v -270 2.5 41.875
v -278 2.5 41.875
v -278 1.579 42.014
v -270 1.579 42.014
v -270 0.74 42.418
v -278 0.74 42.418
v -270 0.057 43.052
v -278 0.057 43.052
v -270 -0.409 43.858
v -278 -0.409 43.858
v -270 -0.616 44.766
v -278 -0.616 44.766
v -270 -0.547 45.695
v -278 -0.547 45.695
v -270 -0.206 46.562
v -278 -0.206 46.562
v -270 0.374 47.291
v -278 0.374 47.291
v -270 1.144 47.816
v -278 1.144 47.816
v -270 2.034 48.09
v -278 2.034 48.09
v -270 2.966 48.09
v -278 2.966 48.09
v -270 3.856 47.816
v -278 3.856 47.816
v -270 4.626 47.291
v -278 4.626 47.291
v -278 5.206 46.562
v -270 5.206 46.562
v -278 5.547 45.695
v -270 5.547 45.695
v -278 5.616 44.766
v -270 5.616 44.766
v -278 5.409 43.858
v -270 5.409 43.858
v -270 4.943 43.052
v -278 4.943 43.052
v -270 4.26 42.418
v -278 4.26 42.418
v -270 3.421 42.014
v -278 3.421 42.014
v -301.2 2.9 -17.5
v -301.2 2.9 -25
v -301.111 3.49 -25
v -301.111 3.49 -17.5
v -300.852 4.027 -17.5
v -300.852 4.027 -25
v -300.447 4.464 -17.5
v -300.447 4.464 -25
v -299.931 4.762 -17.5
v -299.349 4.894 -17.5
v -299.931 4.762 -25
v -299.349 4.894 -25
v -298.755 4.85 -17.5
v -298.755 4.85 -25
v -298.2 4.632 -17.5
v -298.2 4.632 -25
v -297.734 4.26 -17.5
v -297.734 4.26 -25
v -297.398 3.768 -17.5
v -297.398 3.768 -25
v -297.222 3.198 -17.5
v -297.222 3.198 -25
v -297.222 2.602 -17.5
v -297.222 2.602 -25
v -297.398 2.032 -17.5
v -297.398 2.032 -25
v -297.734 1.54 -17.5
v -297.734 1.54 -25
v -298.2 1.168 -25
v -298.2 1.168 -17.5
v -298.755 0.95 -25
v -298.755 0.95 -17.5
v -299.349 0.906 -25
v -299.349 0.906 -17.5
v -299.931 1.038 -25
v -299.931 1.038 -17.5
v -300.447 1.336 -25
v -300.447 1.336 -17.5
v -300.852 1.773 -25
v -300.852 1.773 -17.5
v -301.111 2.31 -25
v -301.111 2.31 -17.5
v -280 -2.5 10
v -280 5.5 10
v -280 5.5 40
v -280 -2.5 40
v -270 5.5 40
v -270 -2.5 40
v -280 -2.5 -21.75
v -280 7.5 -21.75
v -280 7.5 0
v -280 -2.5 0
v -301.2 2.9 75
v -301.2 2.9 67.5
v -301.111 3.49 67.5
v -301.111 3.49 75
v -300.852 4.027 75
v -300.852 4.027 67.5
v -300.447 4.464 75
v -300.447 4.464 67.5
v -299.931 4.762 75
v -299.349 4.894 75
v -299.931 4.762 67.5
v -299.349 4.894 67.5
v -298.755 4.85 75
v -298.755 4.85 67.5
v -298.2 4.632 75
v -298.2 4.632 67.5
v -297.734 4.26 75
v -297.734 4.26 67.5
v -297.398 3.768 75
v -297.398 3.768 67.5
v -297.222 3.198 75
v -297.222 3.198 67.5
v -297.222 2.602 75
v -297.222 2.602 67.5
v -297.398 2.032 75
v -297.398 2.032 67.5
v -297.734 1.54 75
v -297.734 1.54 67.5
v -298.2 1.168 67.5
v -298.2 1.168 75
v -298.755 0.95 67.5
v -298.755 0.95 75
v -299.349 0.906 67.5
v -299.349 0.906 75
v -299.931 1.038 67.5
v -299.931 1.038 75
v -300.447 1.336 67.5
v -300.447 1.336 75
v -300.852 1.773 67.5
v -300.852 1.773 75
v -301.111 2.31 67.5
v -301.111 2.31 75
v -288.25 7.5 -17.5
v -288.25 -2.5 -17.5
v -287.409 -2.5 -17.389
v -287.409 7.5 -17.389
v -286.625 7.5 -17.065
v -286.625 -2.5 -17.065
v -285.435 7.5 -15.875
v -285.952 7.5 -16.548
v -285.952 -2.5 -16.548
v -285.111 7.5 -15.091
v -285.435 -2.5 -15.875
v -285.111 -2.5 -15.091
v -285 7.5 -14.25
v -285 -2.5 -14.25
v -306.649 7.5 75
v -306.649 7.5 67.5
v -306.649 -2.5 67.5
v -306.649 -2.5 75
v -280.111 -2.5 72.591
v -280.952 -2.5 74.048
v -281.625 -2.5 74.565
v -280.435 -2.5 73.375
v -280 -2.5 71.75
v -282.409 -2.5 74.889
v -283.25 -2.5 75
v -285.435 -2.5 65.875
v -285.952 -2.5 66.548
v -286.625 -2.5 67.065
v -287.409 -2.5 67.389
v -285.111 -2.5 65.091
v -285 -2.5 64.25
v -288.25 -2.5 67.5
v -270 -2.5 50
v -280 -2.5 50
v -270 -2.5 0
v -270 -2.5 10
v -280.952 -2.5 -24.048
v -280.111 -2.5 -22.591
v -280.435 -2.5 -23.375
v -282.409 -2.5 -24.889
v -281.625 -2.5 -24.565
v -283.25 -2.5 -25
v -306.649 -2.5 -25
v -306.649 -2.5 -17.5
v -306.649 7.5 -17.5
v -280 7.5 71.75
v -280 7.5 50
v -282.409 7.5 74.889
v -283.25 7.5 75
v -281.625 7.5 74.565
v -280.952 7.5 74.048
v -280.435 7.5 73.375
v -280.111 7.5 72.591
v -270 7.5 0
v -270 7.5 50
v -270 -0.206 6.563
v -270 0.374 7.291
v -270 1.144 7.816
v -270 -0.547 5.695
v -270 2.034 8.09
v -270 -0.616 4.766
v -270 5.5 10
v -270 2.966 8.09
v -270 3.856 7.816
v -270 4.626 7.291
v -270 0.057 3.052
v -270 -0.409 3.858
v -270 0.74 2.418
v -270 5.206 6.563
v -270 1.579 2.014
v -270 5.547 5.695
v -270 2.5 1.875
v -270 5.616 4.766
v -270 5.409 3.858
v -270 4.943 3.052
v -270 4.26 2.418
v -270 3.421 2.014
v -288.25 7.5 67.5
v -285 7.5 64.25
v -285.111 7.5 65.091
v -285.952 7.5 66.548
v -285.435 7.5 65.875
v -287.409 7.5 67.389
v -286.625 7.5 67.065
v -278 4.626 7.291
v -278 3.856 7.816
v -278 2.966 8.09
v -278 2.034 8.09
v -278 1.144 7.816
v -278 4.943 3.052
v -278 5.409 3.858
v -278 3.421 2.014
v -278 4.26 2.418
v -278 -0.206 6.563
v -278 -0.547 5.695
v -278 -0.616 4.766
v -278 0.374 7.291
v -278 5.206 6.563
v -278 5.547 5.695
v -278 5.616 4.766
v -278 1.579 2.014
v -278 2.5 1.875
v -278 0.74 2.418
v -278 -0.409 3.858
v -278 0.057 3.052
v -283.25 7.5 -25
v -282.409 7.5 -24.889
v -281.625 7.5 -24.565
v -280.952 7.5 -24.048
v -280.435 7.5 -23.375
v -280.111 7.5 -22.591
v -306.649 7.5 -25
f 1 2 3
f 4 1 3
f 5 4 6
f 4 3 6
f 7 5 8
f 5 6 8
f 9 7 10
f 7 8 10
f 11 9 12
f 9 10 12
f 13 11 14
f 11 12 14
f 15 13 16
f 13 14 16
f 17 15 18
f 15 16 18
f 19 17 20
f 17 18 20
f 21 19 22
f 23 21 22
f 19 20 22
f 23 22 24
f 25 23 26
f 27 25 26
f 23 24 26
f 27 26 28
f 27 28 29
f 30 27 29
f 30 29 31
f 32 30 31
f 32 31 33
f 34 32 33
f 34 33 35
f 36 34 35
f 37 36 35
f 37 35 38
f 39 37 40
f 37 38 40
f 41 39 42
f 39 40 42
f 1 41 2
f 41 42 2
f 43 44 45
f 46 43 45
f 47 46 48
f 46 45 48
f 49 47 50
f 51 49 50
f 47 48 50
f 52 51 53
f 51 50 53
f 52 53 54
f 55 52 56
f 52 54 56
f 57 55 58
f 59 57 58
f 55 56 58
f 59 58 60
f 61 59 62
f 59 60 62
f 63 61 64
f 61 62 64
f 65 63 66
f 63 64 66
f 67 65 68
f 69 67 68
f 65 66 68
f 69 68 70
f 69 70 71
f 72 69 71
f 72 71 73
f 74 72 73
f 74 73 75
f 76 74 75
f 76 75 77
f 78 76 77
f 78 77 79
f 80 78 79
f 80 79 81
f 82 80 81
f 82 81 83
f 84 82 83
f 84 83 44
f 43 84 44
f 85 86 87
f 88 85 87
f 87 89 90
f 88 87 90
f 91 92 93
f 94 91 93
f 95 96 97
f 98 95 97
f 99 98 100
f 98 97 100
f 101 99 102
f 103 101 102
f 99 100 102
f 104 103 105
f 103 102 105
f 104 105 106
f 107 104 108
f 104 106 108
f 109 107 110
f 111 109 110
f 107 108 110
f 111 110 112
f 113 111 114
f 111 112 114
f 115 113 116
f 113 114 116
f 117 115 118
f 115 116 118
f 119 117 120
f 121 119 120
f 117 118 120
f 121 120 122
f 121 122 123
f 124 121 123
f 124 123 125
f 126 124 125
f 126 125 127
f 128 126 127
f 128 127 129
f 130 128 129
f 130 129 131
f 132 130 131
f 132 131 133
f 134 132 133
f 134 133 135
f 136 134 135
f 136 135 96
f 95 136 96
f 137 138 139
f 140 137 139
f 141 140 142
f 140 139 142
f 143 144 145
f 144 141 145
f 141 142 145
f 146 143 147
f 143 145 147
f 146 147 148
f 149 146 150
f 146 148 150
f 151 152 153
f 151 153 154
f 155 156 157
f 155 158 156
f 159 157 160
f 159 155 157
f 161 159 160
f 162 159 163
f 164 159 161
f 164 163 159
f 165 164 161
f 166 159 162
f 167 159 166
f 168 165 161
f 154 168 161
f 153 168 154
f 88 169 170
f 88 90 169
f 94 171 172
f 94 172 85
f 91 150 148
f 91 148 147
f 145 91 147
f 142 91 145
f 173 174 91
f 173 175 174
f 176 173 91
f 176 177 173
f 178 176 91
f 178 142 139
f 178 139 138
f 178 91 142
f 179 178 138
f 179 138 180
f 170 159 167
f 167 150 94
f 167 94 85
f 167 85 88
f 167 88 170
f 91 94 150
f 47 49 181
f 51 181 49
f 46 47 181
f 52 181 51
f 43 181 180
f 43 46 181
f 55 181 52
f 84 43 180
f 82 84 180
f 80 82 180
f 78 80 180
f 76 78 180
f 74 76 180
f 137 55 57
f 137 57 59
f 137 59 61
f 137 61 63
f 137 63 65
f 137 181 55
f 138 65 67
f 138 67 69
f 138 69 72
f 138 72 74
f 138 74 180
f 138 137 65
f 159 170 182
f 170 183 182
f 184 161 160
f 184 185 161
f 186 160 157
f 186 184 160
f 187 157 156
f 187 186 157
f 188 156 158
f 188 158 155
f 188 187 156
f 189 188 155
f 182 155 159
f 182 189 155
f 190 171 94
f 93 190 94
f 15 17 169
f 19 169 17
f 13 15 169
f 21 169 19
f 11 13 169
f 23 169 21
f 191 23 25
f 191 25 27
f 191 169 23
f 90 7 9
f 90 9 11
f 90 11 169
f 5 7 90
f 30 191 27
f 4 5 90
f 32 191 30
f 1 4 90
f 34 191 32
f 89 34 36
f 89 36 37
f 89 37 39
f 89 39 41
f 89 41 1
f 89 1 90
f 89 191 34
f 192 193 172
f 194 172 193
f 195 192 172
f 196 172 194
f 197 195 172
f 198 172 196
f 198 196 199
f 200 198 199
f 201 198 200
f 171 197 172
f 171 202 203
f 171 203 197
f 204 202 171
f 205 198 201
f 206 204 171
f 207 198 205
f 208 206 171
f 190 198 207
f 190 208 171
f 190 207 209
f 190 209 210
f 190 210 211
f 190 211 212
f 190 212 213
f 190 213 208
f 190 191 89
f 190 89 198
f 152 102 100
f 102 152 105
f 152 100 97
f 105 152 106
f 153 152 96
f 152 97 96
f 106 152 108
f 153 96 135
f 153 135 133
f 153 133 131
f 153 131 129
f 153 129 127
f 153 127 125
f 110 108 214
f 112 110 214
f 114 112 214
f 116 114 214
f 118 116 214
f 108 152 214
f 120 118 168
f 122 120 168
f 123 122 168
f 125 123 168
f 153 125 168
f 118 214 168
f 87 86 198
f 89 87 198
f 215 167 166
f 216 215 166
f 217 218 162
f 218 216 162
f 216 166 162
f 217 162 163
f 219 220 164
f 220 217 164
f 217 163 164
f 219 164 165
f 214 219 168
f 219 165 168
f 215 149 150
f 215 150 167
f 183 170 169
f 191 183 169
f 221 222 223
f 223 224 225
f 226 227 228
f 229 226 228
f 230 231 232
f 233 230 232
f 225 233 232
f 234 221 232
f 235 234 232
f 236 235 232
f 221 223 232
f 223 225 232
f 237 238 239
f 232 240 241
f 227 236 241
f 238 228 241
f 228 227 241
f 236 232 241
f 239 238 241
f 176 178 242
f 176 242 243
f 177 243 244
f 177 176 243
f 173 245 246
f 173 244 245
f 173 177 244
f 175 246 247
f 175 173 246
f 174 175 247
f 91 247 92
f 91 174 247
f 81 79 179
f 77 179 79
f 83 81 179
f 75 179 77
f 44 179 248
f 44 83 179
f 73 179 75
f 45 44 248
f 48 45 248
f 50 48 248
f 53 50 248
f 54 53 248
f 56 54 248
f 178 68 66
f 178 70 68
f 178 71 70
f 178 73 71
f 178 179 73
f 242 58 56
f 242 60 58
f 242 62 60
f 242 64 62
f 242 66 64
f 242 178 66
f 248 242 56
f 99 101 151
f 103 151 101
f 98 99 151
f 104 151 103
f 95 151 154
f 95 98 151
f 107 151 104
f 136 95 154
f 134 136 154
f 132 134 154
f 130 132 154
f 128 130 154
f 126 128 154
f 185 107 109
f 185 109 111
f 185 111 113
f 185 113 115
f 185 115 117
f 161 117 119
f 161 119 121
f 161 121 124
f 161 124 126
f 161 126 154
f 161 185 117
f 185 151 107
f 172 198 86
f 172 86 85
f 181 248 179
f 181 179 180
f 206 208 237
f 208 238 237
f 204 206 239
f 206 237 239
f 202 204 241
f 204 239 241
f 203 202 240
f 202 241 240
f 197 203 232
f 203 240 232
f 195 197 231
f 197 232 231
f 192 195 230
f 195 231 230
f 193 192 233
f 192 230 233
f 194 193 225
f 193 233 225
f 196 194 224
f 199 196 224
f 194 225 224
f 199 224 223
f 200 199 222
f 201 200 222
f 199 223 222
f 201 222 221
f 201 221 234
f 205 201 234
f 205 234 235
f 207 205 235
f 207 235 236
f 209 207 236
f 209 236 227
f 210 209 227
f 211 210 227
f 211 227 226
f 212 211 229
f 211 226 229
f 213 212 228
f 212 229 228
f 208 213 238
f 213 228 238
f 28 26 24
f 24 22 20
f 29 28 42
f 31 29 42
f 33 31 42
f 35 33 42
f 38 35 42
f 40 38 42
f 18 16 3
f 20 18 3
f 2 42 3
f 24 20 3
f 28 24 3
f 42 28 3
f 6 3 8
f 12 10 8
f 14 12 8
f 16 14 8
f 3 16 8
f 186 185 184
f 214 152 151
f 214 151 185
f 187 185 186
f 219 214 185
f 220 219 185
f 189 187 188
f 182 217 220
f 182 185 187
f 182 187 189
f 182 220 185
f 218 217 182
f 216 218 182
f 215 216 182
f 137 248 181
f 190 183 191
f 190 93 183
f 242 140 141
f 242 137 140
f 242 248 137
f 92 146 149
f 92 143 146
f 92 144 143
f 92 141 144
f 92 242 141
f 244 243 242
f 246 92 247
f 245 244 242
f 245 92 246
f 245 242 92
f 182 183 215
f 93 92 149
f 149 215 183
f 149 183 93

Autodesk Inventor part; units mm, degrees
ref_plane "YZ Plane" through (0, 0, 0) normal (1, 0, 0) x (0, 1, 0)
ref_plane "XZ Plane" through (0, 0, 0) normal (0, 1, 0) x (-1, 0, 0)
ref_plane "XY Plane" through (0, 0, 0) normal (0, 0, 1) x (1, 0, 0)
sketch "Sketch1" plane through (0, 0, 0) normal (0, 1, 0) x (-1, 0, 0)
  line L0 (0, 0) -> (50, 0)
  line L1 (50, 0) -> (50, 50)
  line L2 (50, 50) -> (0, 50)
  line L3 (0, 50) -> (0, 0)
  line L4 (50, 50) -> (290, 50)
  line L5 (290, 50) -> (290, 42.5)
  line L6 (290, 42.5) -> (50, 42.5)
  line L7 (50, 42.5) -> (50, 50)
  line L8 (50, 0) -> (290, 0)
  line L9 (290, 0) -> (290, 7.5)
  line L10 (290, 7.5) -> (50, 7.5)
  line L11 (50, 7.5) -> (50, 0)
  dimension "d0" = 50
  dimension "d1" = 50
  dimension "d2" = 240
  dimension "d3" = 7.5
  dimension "d4" = 7.5
extrude "Extrusion1" add sketch "Sketch1" along normal blind 7.5
sketch "Sketch2" plane through (0, 7.5, 0) normal (0, 1, 0) x (1, 0, 0)
  line L0 (0, -50) -> (0, 0) projected
  point P0 (0, -25)
hole "Hole1" at (0, 7.5, 25) direction (0, -1, 0) diameter 6.35 end through all
sketch "Sketch3" plane through (0, 7.5, 0) normal (0, 1, 0) x (1, 0, 0)
  line L0 (-3.175, -50) -> (-3.175, 0) construction
  line L1 (-3.175, -50) -> (-28.175, -50) construction
  line L2 (-28.175, -50) -> (-28.175, 0) construction
  line L3 (-28.175, 0) -> (-3.175, 0) construction
  point P0 (0, 0)
  point P1 (-7.175, -4)
  point P2 (-24.175, -46)
  dimension "d14" = 25
hole "Hole2" at (-7.175, 7.5, 4) at (-24.175, 7.5, 46) direction (0, -1, 0) diameter 3.3 end through all
sketch "Sketch4" plane through (0, 7.5, 0) normal (0, 1, 0) x (1, 0, 0)
  arc A0 (0, -21.825) -> (0, -28.175) centre (0, -25) ccw construction
  line L0 (-3.175, -25) -> (-28.175, -25) construction
  line L1 (-3.175, -25) -> (21.825, -25) construction
  line L2 (-290, -50) -> (0, -50) construction
  line L3 (-28.175, -50) -> (-28.175, 0) construction
  line L4 (-50, -7.5) -> (-50, -42.5) construction
  line L5 (-50, -42.5) -> (-45, -42.5) construction
  line L6 (-45, -42.5) -> (-45, -32.5) construction
  line L7 (-45, -32.5) -> (-50, -32.5) construction
  line L8 (-50, -32.5) -> (-50, -42.5) construction
  line L9 (-45, -32.5) -> (-40, -32.5)
  line L10 (-40, -32.5) -> (-40, -42.5)
  line L11 (-40, -42.5) -> (-45, -42.5)
  line L12 (-45, -42.5) -> (-45, -32.5)
  point P0 (0, 0)
  dimension "d22" = 25
  dimension "d23" = 180
  dimension "d24" = 5
  dimension "d25" = 10
  dimension "d26" = 5
extrude "Extrusion2" add sketch "Sketch4" along normal blind 17.5
sketch "Sketch5" plane through (0, 7.5, 0) normal (0, 1, 0) x (1, 0, 0)
  line L0 (-85, -7.5) -> (-85, -42.5)
  line L1 (-127.5, -7.5) -> (-127.5, -42.5)
  line L2 (-92.5, -42.5) -> (-92.5, -7.5)
  line L3 (-135, -7.5) -> (-170, -7.5) construction
  line L4 (-170, -7.5) -> (-170, -42.5) construction
  line L5 (-170, -42.5) -> (-135, -42.5) construction
  line L6 (-135, -42.5) -> (-135, -7.5) construction
  line L7 (-177.5, -7.5) -> (-212.5, -7.5) construction
  line L8 (-212.5, -7.5) -> (-212.5, -42.5) construction
  line L9 (-212.5, -42.5) -> (-177.5, -42.5) construction
  line L10 (-177.5, -42.5) -> (-177.5, -7.5) construction
  line L11 (-220, -7.5) -> (-255, -7.5) construction
  line L12 (-255, -7.5) -> (-255, -42.5) construction
  line L13 (-255, -42.5) -> (-220, -42.5) construction
  line L14 (-220, -42.5) -> (-220, -7.5) construction
  line L15 (-85, -7.5) -> (-92.5, -7.5) construction
  line L16 (-92.5, -7.5) -> (-92.5, -42.5) construction
  line L17 (-92.5, -42.5) -> (-85, -42.5) construction
  line L18 (-85, -42.5) -> (-85, -7.5) construction
  line L19 (-127.5, -7.5) -> (-135, -7.5) construction
  line L20 (-135, -7.5) -> (-135, -42.5) construction
  line L21 (-135, -42.5) -> (-127.5, -42.5) construction
  line L22 (-127.5, -42.5) -> (-127.5, -7.5) construction
  line L23 (-170, -7.5) -> (-177.5, -7.5) construction
  line L24 (-177.5, -7.5) -> (-177.5, -42.5) construction
  line L25 (-177.5, -42.5) -> (-170, -42.5) construction
  line L26 (-170, -42.5) -> (-170, -7.5) construction
  line L27 (-212.5, -7.5) -> (-220, -7.5) construction
  line L28 (-220, -7.5) -> (-220, -42.5) construction
  line L29 (-220, -42.5) -> (-212.5, -42.5) construction
  line L30 (-212.5, -42.5) -> (-212.5, -7.5) construction
  line L31 (-220, -7.5) -> (-212.5, -7.5)
  line L32 (-212.5, -7.5) -> (-212.5, -42.5)
  line L33 (-212.5, -42.5) -> (-220, -42.5)
  line L34 (-220, -42.5) -> (-220, -7.5)
  line L35 (-177.5, -7.5) -> (-170, -7.5)
  line L36 (-170, -7.5) -> (-170, -42.5)
  line L37 (-170, -42.5) -> (-177.5, -42.5)
  line L38 (-177.5, -42.5) -> (-177.5, -7.5)
  line L39 (-135, -7.5) -> (-127.5, -7.5)
  line L40 (-127.5, -7.5) -> (-127.5, -42.5)
  line L41 (-127.5, -42.5) -> (-135, -42.5)
  line L42 (-135, -42.5) -> (-135, -7.5)
  line L43 (-92.5, -7.5) -> (-85, -7.5)
  line L44 (-85, -7.5) -> (-85, -42.5)
  line L45 (-85, -42.5) -> (-92.5, -42.5)
  line L46 (-92.5, -42.5) -> (-92.5, -7.5)
  point P0 (0, 0)
  point P1 (-50, -7.5)
  dimension "d30" = 35
  dimension "d31" = 35
  dimension "d32" = 35
  dimension "d33" = 35
  dimension "d34" = 35
  dimension "d35" = 35
extrude "Extrusion3" add sketch "Sketch5" against normal blind 2
sketch "Sketch6" plane through (0, 7.5, 0) normal (0, 1, 0) x (1, 0, 0)
  line L0 (-290, 0) -> (-290, -7.5) projected
  line L1 (-290, -50) -> (0, -50) projected
  line L2 (-290, 0) -> (-280, 0)
  line L3 (-280, 0) -> (-280, -50)
  line L4 (-280, -50) -> (-290, -50)
  line L5 (-290, -50) -> (-290, 0)
  point P0 (0, 0)
  dimension "d38" = 10
extrude "Extrusion4" cut sketch "Sketch6" against normal blind 7.5
sketch "Sketch7" plane through (-280, 7.5, 0) normal (-1, 0, 0) x (0, 0, 1)
  point P0 (0, -7.5)
sketch "Sketch8" plane through (-280, 7.5, 0) normal (-1, 0, 0) x (0, 0, 1)
  line L0 (-25, 0) -> (75, 0)
  line L1 (75, 0) -> (75, -7.5)
  line L2 (75, -7.5) -> (-25, -7.5)
  line L3 (-25, -7.5) -> (-25, 0)
  line L4 (-25, 0) -> (75, 0)
  line L5 (75, 0) -> (75, -10)
  line L6 (75, -10) -> (-25, -10)
  line L7 (-25, -10) -> (-25, 0)
  point P0 (0, -7.5)
  dimension "d41" = 100
  dimension "d42" = 10
extrude "Extrusion5" add sketch "Sketch8" along normal blind 7.5
sketch "Sketch9" plane through (-287.5, 7.5, 0) normal (-1, 0, 0) x (0, 0, 1)
  line L0 (75, 0) -> (-25, 0) projected
  line L1 (-25, -10) -> (75, -10) projected
  line L2 (-25, 0) -> (-17.5, 0)
  line L3 (-17.5, 0) -> (-17.5, -10)
  line L4 (-17.5, -10) -> (-25, -10)
  line L5 (-25, -10) -> (-25, 0)
  line L6 (75, 0) -> (67.5, 0)
  line L7 (67.5, 0) -> (67.5, -10)
  line L8 (67.5, -10) -> (75, -10)
  line L9 (75, -10) -> (75, 0)
  point P0 (0, -7.5)
  dimension "d45" = 7.5
  dimension "d46" = 7.5
extrude "Extrusion6" add sketch "Sketch9" along normal blind 25 contours L9 L1 L7 L0 | L3 L1 L5 L0
sketch "Sketch10" plane through (-287.5, -2.5, -17.5) normal (0, 0, 1) x (1, 0, 0)
  line L0 (0, 0) -> (-25, 0) construction
  line L1 (0, 0) -> (-3, 0) construction
  line L2 (-3, 0) -> (-6.2, 0)
  line L3 (-6.2, 0) -> (-6.2, 2.1)
  line L4 (-6.2, 2.1) -> (-3, 2.1)
  line L5 (-3, 2.1) -> (-3, 0)
  line L6 (-6.2, 2.1) -> (-11.7, 2.1) construction
  line L7 (-11.7, 2.1) -> (-11.7, 5.4) construction
  point P0 (287.5, 2.5)
  dimension "d49" = 3
  dimension "d50" = 3.2
  dimension "d51" = 2.1
  dimension "d52" = 5.5
  dimension "d53" = 3.3
extrude "Extrusion7" add sketch "Sketch10" along normal blind 92.5
sketch "Sketch11" plane through (-287.5, -2.5, -17.5) normal (0, 0, 1) x (1, 0, 0)
  line L0 (-6.2, 2.1) -> (-3, 2.1) construction
  line L1 (-6.2, 2.1) -> (-11.7, 2.1) construction
  line L2 (-11.7, 2.1) -> (-11.7, 5.4) construction
  circle A0 centre (-11.7, 5.4) radius 2.125
  point P0 (287.5, 2.5)
  dimension "d56" = 5.5
  dimension "d57" = 3.3
  dimension "d58" = 4.25
extrude "Extrusion8" cut sketch "Sketch11" along normal mid plane 241
sketch "Sketch12" plane through (-287.5, -2.5, -17.5) normal (0, 0, 1) x (1, 0, 0)
  circle A0 centre (-11.7, 5.4) radius 2.125 construction
  line L0 (-11.7, 5.4) -> (-11.7, 0.96) construction
  line L1 (-11.7, 0.96) -> (-16.7, 0.96) construction
  line L2 (-6.2, 0) -> (-25, 0) projected
  line L3 (-16.7, 0.96) -> (-19.2, 0.96)
  line L4 (-19.2, 0.96) -> (-19.2, 0)
  line L5 (-19.2, 0) -> (-16.7, 0)
  line L6 (-16.7, 0) -> (-16.7, 0.96)
  point P0 (287.5, 2.5)
  dimension "d61" = 4.44
  dimension "d62" = 5
  dimension "d63" = 2.5
extrude "Extrusion9" add sketch "Sketch12" along normal blind 91.25
sketch "Sketch13" plane through (-293.7, -0.4, -17.5) normal (0, 1, 0) x (1, 0, 0)
  line L0 (3.2, 0) -> (3.2, -85) construction
  line L1 (3.2, 0) -> (3.2, -30) construction
  line L2 (0, 0) -> (0, -85) construction
  line L3 (3.2, -30) -> (0, -30) construction
  line L4 (0, -30) -> (0, -36.35) construction
  line L5 (0, -36.35) -> (3.2, -36.35) construction
  line L6 (3.2, -36.35) -> (3.2, -30) construction
  line L7 (0, -30) -> (3.2, -30)
  line L8 (3.2, -30) -> (3.2, -36.35)
  line L9 (3.2, -36.35) -> (0, -36.35)
  line L10 (0, -36.35) -> (0, -30)
  point P0 (293.7, -17.5)
  dimension "d66" = 30
  dimension "d67" = 6.35
extrude "Extrusion10" add sketch "Sketch13" along normal blind 3.8
sketch "Sketch14" plane through (0, 7.5, 0) normal (0, 1, 0) x (1, 0, 0)
  line L0 (-287.5, 17.5) -> (-287.5, -67.5) projected
  line L1 (-287.5, 17.5) -> (-285, 17.5)
  line L2 (-285, 17.5) -> (-285, -67.5)
  line L3 (-285, -67.5) -> (-287.5, -67.5)
  line L4 (-287.5, -67.5) -> (-287.5, 17.5)
  point P0 (0, 0)
  dimension "d70" = 2.5
extrude "Extrusion11" cut sketch "Sketch14" against normal blind 14.55
sketch "Sketch15" plane through (0, 7.5, 0) normal (0, 1, 0) x (1, 0, 0)
  line L0 (-312.5, 17.5) -> (-312.5, 25) projected
  line L1 (-280, -75) -> (-312.5, -75) projected
  line L2 (-312.5, 25) -> (-306.6488, 25)
  line L3 (-306.6488, 25) -> (-306.6488, -75)
  line L4 (-306.6488, -75) -> (-312.5, -75)
  line L5 (-312.5, -75) -> (-312.5, 25)
  point P0 (0, 0)
extrude "Extrusion12" cut sketch "Sketch15" against normal blind 14.55
fillet "Fillet1" radius 0.1 1 edges at (-301.325, 2.9, -17.5)
fillet "Fillet2" radius 0.1 1 edges at (-301.325, 2.9, 67.5)
fillet "Fillet3" radius 3.25 1 edges at (-280, 2.5, 75)
fillet "Fillet4" radius 3.25 1 edges at (-285, 2.5, 67.5)
fillet "Fillet5" radius 3.25 1 edges at (-280, 2.5, -25)
fillet "Fillet6" radius 3.25 1 edges at (-285, 2.5, -17.5)
sketch "Sketch16" plane through (0, 7.5, 0) normal (0, 1, 0) x (1, 0, 0)
  line L0 (-220, -42.5) -> (-220, -7.5) construction
  line L1 (-220, -42.5) -> (-280, -42.5) construction
  line L2 (-220, -7.5) -> (-255, -7.5) construction
  line L3 (-255, -7.5) -> (-255, -42.5) construction
  line L4 (-255, -42.5) -> (-220, -42.5) construction
  line L5 (-220, -42.5) -> (-220, -7.5) construction
  line L6 (-280, -7.5) -> (-280, 0) projected
  line L7 (-280, -7.5) -> (-270, -7.5)
  line L8 (-270, -7.5) -> (-270, -42.5)
  line L9 (-270, -42.5) -> (-280, -42.5)
  line L10 (-280, -42.5) -> (-280, -7.5)
  point P0 (0, 0)
  dimension "d81" = 35
  dimension "d82" = 10
extrude "Extrusion13" add sketch "Sketch16" against normal blind 2
sketch "Sketch17" plane through (0, 7.5, 0) normal (0, 1, 0) x (1, 0, 0)
  point P0 (0, 0)
sketch "Sketch18" plane through (0, 7.5, 0) normal (0, 1, 0) x (1, 0, 0)
  line L0 (-270, -7.5) -> (-270, -42.5) construction
  line L1 (-285, -64.25) -> (-285, 14.25) construction
  line L2 (-280, -7.5) -> (-280, 0) construction
  line L3 (-270, -7.5) -> (-280, -7.5) construction
  line L4 (-275, -7.5) -> (-275, -42.5) construction
  line L5 (-50, -42.5) -> (-280, -42.5) construction
  circle A0 centre (-275, -12.5) radius 1.8 construction
  circle A1 centre (-275, -37.5) radius 1.8 construction
  circle A2 centre (-275, -12.5) radius 1.8
  circle A3 centre (-275, -37.5) radius 1.8
  point P0 (0, 0)
  dimension "d85" = 3.6
  dimension "d86" = 3.6
hole "Hole3" at (-275, 7.5, 12.5) at (-275, 7.5, 37.5) direction (0, -1, 0) diameter 3.3 depth 15 tip angle 118
sketch "Sketch19" plane through (0, 7.5, 0) normal (0, 1, 0) x (1, 0, 0)
  circle A0 centre (-275, -12.5) radius 1.65 construction
  line L0 (-275, -12.5) -> (-212.5, -12.5) construction
  line L1 (-212.5, -7.5) -> (-212.5, -42.5) construction
  circle A1 centre (-275, -37.5) radius 1.65 construction
  line L2 (-275, -37.5) -> (-212.5, -37.5) construction
  line L3 (-220, -42.5) -> (-220, -7.5) construction
  line L4 (-220, -12.5) -> (-212.5, -12.5) construction
  line L5 (-216.25, -12.5) -> (-216.25, -37.5) construction
  point P0 (0, 0)
hole "Hole4" at (-216.25, 7.5, 12.5) at (-216.25, 7.5, 37.5) direction (0, -1, 0) diameter 3.3 depth 15 tip angle 118
sketch "Sketch20" plane through (-45, 7.5, 32.5) normal (-1, 0, 0) x (0, 0, 1)
  line L0 (10, 17.5) -> (0, 17.5) construction
  line L1 (5, 17.5) -> (5, -0.1335) construction
  line L2 (10, 0) -> (10, 17.5) construction
  line L3 (10, 12.5) -> (5, 12.5) construction
  circle A0 centre (5, 12.5) radius 3
  point P0 (-32.5, -7.5)
  dimension "d101" = 6
extrude "Extrusion14" cut sketch "Sketch20" against normal blind 20
sketch "Sketch21" plane through (0, 7.5, 0) normal (0, 1, 0) x (1, 0, 0)
  line L0 (-306.6488, 17.5) -> (-306.6488, -67.5) projected
  line L1 (-306.6488, 17.5) -> (-288.25, 17.5) projected
  line L2 (-306.6488, -67.5) -> (-288.25, -67.5)
  line L3 (-288.25, -67.5) -> (-288.25, 17.5)
  line L4 (-288.25, 17.5) -> (-306.6488, 17.5)
  line L5 (-306.6488, 17.5) -> (-306.6488, -67.5)
  point P0 (0, 0)
extrude "Extrusion15" cut sketch "Sketch21" against normal blind 10
sketch "Sketch22" plane through (0, 7.5, 0) normal (0, 1, 0) x (1, 0, 0)
  line L0 (-280, -50) -> (0, -50) projected
  line L1 (0, 0) -> (-280, 0) projected
  line L2 (-280, -50) -> (-270.5687, -50)
  line L3 (-270.5687, -50) -> (-270.5687, 0)
  line L4 (-270.5687, 0) -> (-280, 0)
  line L5 (-280, 0) -> (-280, -50)
  line L6 (-50, -42.5) -> (-280, -42.5) projected
  line L7 (-219.3019, -42.5) -> (-213.3073, -42.5)
  line L8 (-213.3073, -42.5) -> (-213.3073, -8.284)
  line L9 (-213.3073, -8.284) -> (-219.3019, -8.284)
  line L10 (-219.3019, -8.284) -> (-219.3019, -42.5)
extrude "Extrusion16" add sketch "Sketch22" against normal blind 2
sketch "Sketch23" plane through (-306.6488, -2.5, -25) normal (0, 0, -1) x (-1, 0, 0)
  circle A0 centre (-7.4488, 5.4) radius 2.125 projected
  circle A1 centre (-7.4488, 5.4) radius 2
  circle A2 centre (-7.4488, 5.4) radius 2.4429
  point P0 (-306.6488, 2.5)
  dimension "d108" = 4
extrude "Extrusion17" add sketch "Sketch23" against normal blind 100 contours A0 | A2
sketch "Sketch24" plane through (0, 7.5, 0) normal (0, 1, 0) x (1, 0, 0)
  line L0 (-288.25, -67.5) -> (-306.6488, -67.5) projected
  arc A0 (-285, 14.25) -> (-288.25, 17.5) centre (-288.25, 14.25) ccw projected
  line L1 (-306.6488, -67.5) -> (-288.25, -67.5)
  line L2 (-288.25, -67.5) -> (-288.25, 17.5)
  line L3 (-288.25, 17.5) -> (-306.6488, 17.5)
  line L4 (-306.6488, 17.5) -> (-306.6488, -67.5)
  point P0 (0, 0)
extrude "Extrusion18" cut sketch "Sketch24" against normal blind 100
sketch "Sketch25" plane through (0, 7.5, 0) normal (0, 1, 0) x (1, 0, 0)
  line L0 (-50, -42.5) -> (-280, -42.5) projected
  line L1 (-280, -7.5) -> (-50, -7.5) projected
  line L2 (-50, -42.5) -> (-55, -42.5)
  line L3 (-55, -42.5) -> (-55, -7.5)
  line L4 (-55, -7.5) -> (-50, -7.5)
  line L5 (-50, -7.5) -> (-50, -42.5)
  point P0 (0, 0)
  dimension "d113" = 5
extrude "Extrusion19" add sketch "Sketch25" against normal blind 2
sketch "Sketch26" plane through (0, 7.5, 0) normal (0, 1, 0) x (1, 0, 0)
  line L0 (-55, -42.5) -> (-85, -42.5) construction
  line L1 (-55, -42.5) -> (-50, -42.5) construction
  line L2 (-55, -42.5) -> (-50, -42.5) construction
  line L3 (-50, -42.5) -> (-50, -7.5) construction
  line L4 (-50, -42.5) -> (-50, -7.5) construction
  circle A0 centre (-50, -37.5) radius 1.65 construction
  circle A1 centre (-50, -12.5) radius 1.65 construction
  circle A2 centre (-50, -37.5) radius 1.65
  circle A3 centre (-50, -12.5) radius 1.65
  line L5 (-50, -37.5) -> (-92.5, -37.5) construction
  line L6 (-92.5, -42.5) -> (-92.5, -7.5) construction
  line L7 (-50, -12.5) -> (-92.5, -12.5) construction
  line L8 (-92.5, -37.5) -> (-85, -37.5) construction
  line L9 (-85, -7.5) -> (-85, -42.5) construction
  line L10 (-88.75, -37.5) -> (-88.75, -12.5) construction
  circle A4 centre (-88.75, -37.5) radius 1.65
  circle A5 centre (-88.75, -12.5) radius 1.65
  point P0 (0, 0)
  dimension "d116" = 3.3
  dimension "d117" = 3.3
  dimension "d118" = 3.3
  dimension "d119" = 3.3
extrude "Extrusion20" cut sketch "Sketch26" against normal blind 2
sketch "Sketch27" plane through (0, 5.5, 0) normal (0, -1, 0) x (1, 0, 0)
  line L0 (-50, 7.5) -> (-55, 7.5) projected
  line L1 (-55, 7.5) -> (-46.6169, 7.5)
  line L2 (-46.6169, 7.5) -> (-46.6169, 42.5)
  line L3 (-46.6169, 42.5) -> (-55, 42.5)
  line L4 (-55, 42.5) -> (-55, 7.5)
  point P0 (0, 0)
extrude "Extrusion21" add sketch "Sketch27" along normal blind 5.5
sketch "Sketch28" plane through (0, 7.5, 0) normal (0, 1, 0) x (1, 0, 0)
  circle A0 centre (-50, -12.5) radius 1.65 projected
  circle A1 centre (-50, -37.5) radius 1.65 projected
  point P0 (0, 0)
hole "Hole5" at (-50, 7.5, 12.5) at (-50, 7.5, 37.5) direction (0, -1, 0) diameter 3.3 depth 8 tip angle 118
sketch "Sketch29" plane through (0, 7.5, 0) normal (0, 1, 0) x (1, 0, 0)
  circle A0 centre (-7.175, -4) radius 1.65 construction
  circle A1 centre (-24.175, -46) radius 1.65 construction
  line L0 (-7.175, -4) -> (-24.175, -46) construction
  line L1 (-7.175, -4) -> (-7.175, -46) construction
  line L2 (-7.175, -46) -> (-24.175, -46) construction
  line L3 (-7.175, -25) -> (-25.825, -25) construction
  line L4 (-25.825, -25) -> (-25.825, -46) construction
  line L5 (-16.5, -25) -> (-25.825, -25) construction
  line L6 (-24.175, -46) -> (-24.175, -25) construction
  line L7 (-15.675, -46) -> (-15.675, -4) construction
  line L8 (-40, -32.5) -> (-40, -42.5) construction
  line L9 (-40, -42.5) -> (-24.175, -42.5) construction
  line L10 (-24.175, -42.5) -> (-24.175, -46) construction
  line L11 (-15.675, -25) -> (-15.675, -46) construction
  line L12 (-15.675, -46) -> (-15.675, -4) construction
  circle A2 centre (-15.675, -46) radius 1.65 construction
  circle A3 centre (-15.675, -46) radius 1.65
  circle A4 centre (-15.675, -4) radius 1.65
  point P0 (0, 0)
  dimension "d131" = 42
  dimension "d132" = 17
  dimension "d133" = 21
  dimension "d135" = 8.5
  dimension "d136" = 15.825
  dimension "d137" = 3.5
  dimension "d138" = 21
  dimension "d139" = 3.3
  dimension "d140" = 3.3
  dimension "d141" = 3.3
extrude "Extrusion22" cut sketch "Sketch29" against normal blind 10
sketch "Sketch30" plane through (0, 7.5, 0) normal (0, 1, 0) x (1, 0, 0)
  circle A0 centre (-7.175, -4) radius 1.65 projected
  circle A1 centre (-7.175, -4) radius 2.1021
  circle A2 centre (-24.175, -46) radius 1.65 projected
  circle A3 centre (-24.175, -46) radius 2.9173
  point P0 (0, 0)
extrude "Extrusion23" add sketch "Sketch30" against normal blind 7.5 contours A0 | A1 | A2 | A3
sketch "Sketch31" plane through (0, 25, 0) normal (0, 1, 0) x (1, 0, 0)
  line L0 (-270, 0) -> (36.5142, 0)
  line L1 (36.5142, 0) -> (36.5142, -133.4678)
  line L2 (36.5142, -133.4678) -> (-270, -133.4678)
  line L3 (-270, -133.4678) -> (-270, 0)
  point P0 (0, 0)
extrude "Extrusion24" cut sketch "Sketch31" against normal blind 1000
sketch "Sketch32" plane through (-270, 7.5, 50) normal (1, 0, 0) x (0, 0, -1)
  line L0 (0, 0) -> (0, -7.5) projected
  line L1 (71.75, -10) -> (-21.75, -10) projected
  line L2 (0, 0) -> (10, 0)
  line L3 (10, 0) -> (10, -10)
  line L4 (10, -10) -> (0, -10)
  line L5 (0, -10) -> (0, 0)
  line L6 (64.25, 0) -> (-14.25, 0) projected
  line L7 (50, 0) -> (40, 0)
  line L8 (40, 0) -> (40, -10)
  line L9 (40, -10) -> (50, -10)
  line L10 (50, -10) -> (50, 0)
  point P0 (50, -7.5)
  dimension "d148" = 10
  dimension "d149" = 10
extrude "Extrusion25" add sketch "Sketch32" against normal blind 10 contours L2 L3 L1 L5 L0 | L6 L10 L1 L8
sketch "Sketch33" plane through (-270, 7.5, 50) normal (1, 0, 0) x (0, 0, -1)
  line L0 (0, 0) -> (50, 0) construction
  line L1 (40, -10) -> (10, -10) construction
  line L2 (0, 0) -> (10, -10) construction
  line L3 (10, -10) -> (0, -10) construction
  line L4 (0, -10) -> (10, 0) construction
  line L5 (40, -10) -> (50, 0) construction
  line L6 (50, -10) -> (40, 0) construction
  point P0 (50, -7.5)
  point P1 (5, -5)
  point P2 (45, -5)
hole "Hole6" at (-270, 2.5, 45) at (-270, 2.5, 5) direction (-1, 0, 0) diameter 6.25 depth 8
properties part number "mtv_frame(BrakeInBack)1-13"
